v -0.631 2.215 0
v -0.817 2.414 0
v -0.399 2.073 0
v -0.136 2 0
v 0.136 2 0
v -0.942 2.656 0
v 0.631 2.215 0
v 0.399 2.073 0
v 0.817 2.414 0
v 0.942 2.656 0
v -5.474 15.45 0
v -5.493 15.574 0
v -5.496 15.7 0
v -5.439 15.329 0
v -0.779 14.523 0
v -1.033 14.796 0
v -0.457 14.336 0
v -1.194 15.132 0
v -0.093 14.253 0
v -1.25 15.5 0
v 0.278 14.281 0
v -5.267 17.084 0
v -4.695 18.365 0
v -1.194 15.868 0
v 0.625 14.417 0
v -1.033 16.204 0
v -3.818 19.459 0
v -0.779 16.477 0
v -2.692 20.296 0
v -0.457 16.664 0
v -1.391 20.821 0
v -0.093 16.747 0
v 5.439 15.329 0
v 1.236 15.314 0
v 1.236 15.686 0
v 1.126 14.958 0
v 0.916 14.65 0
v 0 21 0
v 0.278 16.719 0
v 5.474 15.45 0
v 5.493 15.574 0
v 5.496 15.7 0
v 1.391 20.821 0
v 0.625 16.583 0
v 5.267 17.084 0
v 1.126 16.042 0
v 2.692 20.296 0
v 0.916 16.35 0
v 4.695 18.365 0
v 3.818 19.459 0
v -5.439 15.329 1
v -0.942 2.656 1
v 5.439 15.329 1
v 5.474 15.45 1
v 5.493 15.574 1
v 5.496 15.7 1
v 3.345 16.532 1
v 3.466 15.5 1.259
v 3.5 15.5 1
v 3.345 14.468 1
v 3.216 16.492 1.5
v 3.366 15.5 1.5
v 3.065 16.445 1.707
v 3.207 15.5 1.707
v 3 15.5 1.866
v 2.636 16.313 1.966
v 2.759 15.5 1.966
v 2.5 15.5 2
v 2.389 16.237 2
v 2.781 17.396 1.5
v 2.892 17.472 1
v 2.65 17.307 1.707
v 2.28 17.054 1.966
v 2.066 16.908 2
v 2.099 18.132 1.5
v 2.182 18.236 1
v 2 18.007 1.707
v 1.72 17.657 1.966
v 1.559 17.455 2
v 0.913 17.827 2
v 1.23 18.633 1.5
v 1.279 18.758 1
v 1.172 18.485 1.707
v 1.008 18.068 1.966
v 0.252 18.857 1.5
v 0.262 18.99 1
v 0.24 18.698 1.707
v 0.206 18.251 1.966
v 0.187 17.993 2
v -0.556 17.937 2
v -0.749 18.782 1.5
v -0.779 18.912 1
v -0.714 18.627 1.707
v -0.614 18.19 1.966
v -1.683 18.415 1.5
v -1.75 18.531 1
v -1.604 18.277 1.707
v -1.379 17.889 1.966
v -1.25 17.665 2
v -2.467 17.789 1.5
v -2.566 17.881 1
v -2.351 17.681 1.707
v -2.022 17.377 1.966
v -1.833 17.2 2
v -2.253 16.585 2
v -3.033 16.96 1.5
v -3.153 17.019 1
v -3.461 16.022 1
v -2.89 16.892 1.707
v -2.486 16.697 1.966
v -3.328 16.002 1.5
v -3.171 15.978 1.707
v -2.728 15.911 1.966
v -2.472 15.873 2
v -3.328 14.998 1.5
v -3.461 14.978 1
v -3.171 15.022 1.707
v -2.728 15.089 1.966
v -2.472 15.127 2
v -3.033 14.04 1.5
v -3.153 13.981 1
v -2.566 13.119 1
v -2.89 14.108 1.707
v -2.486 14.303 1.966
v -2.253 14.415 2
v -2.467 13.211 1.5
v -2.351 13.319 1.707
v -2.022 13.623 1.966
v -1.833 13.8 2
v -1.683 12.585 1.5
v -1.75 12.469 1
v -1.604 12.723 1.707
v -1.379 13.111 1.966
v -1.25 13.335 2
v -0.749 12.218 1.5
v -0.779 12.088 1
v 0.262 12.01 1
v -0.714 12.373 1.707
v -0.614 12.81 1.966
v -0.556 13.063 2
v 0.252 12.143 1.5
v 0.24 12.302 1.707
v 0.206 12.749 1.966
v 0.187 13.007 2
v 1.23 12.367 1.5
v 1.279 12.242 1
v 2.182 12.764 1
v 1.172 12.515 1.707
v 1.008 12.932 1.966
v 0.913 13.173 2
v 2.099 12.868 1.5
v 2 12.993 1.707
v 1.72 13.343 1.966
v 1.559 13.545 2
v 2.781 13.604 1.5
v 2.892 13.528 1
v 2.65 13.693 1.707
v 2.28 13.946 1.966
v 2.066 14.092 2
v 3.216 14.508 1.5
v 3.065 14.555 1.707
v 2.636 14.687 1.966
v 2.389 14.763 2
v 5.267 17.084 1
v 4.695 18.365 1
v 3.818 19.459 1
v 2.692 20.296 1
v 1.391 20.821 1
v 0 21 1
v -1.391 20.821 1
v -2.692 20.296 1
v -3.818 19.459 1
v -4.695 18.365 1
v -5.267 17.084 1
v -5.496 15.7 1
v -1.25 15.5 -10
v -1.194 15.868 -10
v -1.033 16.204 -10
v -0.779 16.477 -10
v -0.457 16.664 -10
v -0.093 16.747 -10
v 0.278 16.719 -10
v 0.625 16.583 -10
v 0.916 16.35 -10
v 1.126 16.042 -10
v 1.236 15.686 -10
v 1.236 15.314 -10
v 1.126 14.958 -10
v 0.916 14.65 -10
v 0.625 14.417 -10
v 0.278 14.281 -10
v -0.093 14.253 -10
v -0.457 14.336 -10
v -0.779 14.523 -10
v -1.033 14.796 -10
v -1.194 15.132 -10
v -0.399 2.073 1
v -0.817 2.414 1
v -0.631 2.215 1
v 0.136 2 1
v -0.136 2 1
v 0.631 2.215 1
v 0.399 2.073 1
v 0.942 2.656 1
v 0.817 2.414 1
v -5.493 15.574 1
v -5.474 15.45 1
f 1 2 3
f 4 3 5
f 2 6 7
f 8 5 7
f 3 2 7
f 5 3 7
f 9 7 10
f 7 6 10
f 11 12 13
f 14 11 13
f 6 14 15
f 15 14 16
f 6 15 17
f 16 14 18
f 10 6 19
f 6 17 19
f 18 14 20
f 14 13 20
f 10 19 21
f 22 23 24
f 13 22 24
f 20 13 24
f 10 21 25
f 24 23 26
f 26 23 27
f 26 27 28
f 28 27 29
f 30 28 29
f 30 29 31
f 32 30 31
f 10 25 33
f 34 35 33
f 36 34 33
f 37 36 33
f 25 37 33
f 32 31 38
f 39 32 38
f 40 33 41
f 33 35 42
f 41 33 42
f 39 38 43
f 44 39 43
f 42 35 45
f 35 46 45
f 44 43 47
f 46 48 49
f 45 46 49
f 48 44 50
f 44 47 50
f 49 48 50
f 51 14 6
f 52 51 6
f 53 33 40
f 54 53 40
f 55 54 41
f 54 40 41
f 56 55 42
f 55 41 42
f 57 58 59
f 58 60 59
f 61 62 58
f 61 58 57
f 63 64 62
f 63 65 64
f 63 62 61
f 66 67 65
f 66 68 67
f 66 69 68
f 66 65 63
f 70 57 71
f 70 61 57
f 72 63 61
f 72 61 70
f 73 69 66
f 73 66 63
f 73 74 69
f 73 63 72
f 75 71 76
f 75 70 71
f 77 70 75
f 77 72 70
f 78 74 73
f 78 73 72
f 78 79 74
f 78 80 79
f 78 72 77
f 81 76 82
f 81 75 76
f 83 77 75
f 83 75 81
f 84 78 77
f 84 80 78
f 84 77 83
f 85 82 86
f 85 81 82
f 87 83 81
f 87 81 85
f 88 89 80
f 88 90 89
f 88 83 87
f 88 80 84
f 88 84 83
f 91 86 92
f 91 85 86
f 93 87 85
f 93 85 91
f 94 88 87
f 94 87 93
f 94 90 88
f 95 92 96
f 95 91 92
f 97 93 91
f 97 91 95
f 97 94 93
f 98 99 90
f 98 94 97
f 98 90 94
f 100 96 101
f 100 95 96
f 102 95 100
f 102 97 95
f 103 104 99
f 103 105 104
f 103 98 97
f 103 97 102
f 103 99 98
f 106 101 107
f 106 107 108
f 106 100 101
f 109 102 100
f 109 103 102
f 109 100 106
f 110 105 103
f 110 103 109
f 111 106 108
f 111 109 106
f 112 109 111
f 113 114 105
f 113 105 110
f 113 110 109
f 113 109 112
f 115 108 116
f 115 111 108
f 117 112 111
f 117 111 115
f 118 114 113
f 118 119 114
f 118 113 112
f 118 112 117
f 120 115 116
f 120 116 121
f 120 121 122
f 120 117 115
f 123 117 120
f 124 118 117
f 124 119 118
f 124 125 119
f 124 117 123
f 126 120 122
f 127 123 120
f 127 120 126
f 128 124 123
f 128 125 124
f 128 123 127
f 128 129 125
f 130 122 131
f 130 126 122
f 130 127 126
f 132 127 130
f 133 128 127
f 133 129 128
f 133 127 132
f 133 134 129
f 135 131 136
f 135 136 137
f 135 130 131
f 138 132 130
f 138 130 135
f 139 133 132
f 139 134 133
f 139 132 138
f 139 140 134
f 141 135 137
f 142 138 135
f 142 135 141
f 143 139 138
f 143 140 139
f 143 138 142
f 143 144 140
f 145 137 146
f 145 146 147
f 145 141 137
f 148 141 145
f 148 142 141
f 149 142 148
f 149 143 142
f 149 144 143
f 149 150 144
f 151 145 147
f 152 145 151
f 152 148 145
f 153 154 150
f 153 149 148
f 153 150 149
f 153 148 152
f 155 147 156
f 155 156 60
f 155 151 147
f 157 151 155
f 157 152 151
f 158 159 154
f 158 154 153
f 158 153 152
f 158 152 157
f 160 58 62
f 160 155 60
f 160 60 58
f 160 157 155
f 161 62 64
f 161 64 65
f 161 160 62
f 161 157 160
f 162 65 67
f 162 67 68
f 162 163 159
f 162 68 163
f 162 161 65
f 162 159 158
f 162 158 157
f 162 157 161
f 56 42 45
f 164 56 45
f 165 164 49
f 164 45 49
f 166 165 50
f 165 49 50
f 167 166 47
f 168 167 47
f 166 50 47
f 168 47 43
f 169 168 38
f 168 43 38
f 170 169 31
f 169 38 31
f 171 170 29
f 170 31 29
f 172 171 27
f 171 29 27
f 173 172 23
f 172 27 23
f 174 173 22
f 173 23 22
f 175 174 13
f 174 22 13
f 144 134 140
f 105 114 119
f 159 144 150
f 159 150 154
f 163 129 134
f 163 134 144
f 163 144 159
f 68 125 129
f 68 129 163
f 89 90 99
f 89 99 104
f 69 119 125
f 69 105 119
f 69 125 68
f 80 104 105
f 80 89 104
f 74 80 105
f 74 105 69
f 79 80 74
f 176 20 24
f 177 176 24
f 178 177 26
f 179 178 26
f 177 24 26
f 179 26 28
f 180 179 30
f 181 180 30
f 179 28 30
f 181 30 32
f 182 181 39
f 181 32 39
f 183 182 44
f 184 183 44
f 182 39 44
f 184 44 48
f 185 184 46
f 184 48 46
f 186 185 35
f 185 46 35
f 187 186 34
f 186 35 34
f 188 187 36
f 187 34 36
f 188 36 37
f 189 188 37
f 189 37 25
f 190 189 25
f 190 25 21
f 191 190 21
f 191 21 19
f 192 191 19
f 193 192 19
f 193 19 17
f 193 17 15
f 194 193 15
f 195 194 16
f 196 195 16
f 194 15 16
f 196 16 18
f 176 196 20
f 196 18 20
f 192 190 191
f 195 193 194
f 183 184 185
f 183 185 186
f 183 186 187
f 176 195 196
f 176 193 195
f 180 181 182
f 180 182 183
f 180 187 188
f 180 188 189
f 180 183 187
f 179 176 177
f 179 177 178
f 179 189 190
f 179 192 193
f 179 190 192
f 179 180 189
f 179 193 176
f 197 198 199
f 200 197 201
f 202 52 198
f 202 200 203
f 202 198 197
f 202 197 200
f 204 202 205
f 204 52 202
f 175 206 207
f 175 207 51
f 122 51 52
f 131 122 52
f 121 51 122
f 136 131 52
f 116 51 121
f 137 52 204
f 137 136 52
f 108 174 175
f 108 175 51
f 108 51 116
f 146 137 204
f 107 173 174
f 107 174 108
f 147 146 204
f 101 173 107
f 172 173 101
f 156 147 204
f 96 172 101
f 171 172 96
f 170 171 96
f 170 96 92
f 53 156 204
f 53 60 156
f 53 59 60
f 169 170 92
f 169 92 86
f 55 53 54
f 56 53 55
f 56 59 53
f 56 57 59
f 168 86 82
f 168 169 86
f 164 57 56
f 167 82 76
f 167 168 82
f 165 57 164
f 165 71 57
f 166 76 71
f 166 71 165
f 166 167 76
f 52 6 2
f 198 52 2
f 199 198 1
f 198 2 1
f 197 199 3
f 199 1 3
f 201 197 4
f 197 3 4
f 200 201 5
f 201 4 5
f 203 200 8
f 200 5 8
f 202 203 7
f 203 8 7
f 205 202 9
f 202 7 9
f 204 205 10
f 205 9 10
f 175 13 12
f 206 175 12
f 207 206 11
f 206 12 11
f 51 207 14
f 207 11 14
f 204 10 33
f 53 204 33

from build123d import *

# Parameters (mm, degrees)
DODANIE_WYCI_GNI_CIE1_DEPTH = 1
SZKIC2_R                    = 3.5
DODANIE_WYCI_GNI_CIE2_DEPTH = 1
SZKIC3_R                    = 1.25
DODANIE_WYCI_GNI_CIE3_DEPTH = 10
ZAOKR_GLENIE1_R             = 1


with BuildPart() as part:
    # Szkic1 → Dodanie-wyciągnięcie1 (new body)
    with BuildSketch(Plane.XY):
        with BuildLine():
            Line((0.942427745, 2.655932737), (5.439447033, 15.32935073))
            ThreePointArc((5.439447033, 15.32935073), (5.485445584, 15.51205871), (5.496356907, 15.700151814))
            ThreePointArc((5.496356907, 15.700151814), (0, 21), (-5.496356907, 15.700151814))
            ThreePointArc((-5.496356907, 15.700151814), (-5.485445584, 15.51205871), (-5.439447033, 15.32935073))
            Line((-5.439447033, 15.32935073), (-0.942427745, 2.655932737))
            ThreePointArc((-0.942427745, 2.655932737), (0, 1.990342582), (0.942427745, 2.655932737))
        make_face()
    extrude(amount=DODANIE_WYCI_GNI_CIE1_DEPTH)

    # Szkic2 → Dodanie-wyciągnięcie2 (add)
    with BuildSketch(Plane.XY.offset(1)):
        with Locations((0, 15.5)):
            Circle(SZKIC2_R)
    extrude(amount=DODANIE_WYCI_GNI_CIE2_DEPTH)

    # Szkic3 → Dodanie-wyciągnięcie3 (add)
    with BuildSketch(Plane(origin=(0, 0, 0), x_dir=(-1, 0, 0), z_dir=(0, 0, -1))):
        with Locations((0, 15.5)):
            Circle(SZKIC3_R)
    extrude(amount=DODANIE_WYCI_GNI_CIE3_DEPTH)

    # Zaokrąglenie1
    zaokr_glenie1_edges = [part.edges().sort_by_distance(p)[0] for p in [
        (-3.5, 15.5, 2),
    ]]
    fillet(zaokr_glenie1_edges, radius=ZAOKR_GLENIE1_R - 0.0001)  # a hair under: the kernel refuses the full size


solid = part.part
